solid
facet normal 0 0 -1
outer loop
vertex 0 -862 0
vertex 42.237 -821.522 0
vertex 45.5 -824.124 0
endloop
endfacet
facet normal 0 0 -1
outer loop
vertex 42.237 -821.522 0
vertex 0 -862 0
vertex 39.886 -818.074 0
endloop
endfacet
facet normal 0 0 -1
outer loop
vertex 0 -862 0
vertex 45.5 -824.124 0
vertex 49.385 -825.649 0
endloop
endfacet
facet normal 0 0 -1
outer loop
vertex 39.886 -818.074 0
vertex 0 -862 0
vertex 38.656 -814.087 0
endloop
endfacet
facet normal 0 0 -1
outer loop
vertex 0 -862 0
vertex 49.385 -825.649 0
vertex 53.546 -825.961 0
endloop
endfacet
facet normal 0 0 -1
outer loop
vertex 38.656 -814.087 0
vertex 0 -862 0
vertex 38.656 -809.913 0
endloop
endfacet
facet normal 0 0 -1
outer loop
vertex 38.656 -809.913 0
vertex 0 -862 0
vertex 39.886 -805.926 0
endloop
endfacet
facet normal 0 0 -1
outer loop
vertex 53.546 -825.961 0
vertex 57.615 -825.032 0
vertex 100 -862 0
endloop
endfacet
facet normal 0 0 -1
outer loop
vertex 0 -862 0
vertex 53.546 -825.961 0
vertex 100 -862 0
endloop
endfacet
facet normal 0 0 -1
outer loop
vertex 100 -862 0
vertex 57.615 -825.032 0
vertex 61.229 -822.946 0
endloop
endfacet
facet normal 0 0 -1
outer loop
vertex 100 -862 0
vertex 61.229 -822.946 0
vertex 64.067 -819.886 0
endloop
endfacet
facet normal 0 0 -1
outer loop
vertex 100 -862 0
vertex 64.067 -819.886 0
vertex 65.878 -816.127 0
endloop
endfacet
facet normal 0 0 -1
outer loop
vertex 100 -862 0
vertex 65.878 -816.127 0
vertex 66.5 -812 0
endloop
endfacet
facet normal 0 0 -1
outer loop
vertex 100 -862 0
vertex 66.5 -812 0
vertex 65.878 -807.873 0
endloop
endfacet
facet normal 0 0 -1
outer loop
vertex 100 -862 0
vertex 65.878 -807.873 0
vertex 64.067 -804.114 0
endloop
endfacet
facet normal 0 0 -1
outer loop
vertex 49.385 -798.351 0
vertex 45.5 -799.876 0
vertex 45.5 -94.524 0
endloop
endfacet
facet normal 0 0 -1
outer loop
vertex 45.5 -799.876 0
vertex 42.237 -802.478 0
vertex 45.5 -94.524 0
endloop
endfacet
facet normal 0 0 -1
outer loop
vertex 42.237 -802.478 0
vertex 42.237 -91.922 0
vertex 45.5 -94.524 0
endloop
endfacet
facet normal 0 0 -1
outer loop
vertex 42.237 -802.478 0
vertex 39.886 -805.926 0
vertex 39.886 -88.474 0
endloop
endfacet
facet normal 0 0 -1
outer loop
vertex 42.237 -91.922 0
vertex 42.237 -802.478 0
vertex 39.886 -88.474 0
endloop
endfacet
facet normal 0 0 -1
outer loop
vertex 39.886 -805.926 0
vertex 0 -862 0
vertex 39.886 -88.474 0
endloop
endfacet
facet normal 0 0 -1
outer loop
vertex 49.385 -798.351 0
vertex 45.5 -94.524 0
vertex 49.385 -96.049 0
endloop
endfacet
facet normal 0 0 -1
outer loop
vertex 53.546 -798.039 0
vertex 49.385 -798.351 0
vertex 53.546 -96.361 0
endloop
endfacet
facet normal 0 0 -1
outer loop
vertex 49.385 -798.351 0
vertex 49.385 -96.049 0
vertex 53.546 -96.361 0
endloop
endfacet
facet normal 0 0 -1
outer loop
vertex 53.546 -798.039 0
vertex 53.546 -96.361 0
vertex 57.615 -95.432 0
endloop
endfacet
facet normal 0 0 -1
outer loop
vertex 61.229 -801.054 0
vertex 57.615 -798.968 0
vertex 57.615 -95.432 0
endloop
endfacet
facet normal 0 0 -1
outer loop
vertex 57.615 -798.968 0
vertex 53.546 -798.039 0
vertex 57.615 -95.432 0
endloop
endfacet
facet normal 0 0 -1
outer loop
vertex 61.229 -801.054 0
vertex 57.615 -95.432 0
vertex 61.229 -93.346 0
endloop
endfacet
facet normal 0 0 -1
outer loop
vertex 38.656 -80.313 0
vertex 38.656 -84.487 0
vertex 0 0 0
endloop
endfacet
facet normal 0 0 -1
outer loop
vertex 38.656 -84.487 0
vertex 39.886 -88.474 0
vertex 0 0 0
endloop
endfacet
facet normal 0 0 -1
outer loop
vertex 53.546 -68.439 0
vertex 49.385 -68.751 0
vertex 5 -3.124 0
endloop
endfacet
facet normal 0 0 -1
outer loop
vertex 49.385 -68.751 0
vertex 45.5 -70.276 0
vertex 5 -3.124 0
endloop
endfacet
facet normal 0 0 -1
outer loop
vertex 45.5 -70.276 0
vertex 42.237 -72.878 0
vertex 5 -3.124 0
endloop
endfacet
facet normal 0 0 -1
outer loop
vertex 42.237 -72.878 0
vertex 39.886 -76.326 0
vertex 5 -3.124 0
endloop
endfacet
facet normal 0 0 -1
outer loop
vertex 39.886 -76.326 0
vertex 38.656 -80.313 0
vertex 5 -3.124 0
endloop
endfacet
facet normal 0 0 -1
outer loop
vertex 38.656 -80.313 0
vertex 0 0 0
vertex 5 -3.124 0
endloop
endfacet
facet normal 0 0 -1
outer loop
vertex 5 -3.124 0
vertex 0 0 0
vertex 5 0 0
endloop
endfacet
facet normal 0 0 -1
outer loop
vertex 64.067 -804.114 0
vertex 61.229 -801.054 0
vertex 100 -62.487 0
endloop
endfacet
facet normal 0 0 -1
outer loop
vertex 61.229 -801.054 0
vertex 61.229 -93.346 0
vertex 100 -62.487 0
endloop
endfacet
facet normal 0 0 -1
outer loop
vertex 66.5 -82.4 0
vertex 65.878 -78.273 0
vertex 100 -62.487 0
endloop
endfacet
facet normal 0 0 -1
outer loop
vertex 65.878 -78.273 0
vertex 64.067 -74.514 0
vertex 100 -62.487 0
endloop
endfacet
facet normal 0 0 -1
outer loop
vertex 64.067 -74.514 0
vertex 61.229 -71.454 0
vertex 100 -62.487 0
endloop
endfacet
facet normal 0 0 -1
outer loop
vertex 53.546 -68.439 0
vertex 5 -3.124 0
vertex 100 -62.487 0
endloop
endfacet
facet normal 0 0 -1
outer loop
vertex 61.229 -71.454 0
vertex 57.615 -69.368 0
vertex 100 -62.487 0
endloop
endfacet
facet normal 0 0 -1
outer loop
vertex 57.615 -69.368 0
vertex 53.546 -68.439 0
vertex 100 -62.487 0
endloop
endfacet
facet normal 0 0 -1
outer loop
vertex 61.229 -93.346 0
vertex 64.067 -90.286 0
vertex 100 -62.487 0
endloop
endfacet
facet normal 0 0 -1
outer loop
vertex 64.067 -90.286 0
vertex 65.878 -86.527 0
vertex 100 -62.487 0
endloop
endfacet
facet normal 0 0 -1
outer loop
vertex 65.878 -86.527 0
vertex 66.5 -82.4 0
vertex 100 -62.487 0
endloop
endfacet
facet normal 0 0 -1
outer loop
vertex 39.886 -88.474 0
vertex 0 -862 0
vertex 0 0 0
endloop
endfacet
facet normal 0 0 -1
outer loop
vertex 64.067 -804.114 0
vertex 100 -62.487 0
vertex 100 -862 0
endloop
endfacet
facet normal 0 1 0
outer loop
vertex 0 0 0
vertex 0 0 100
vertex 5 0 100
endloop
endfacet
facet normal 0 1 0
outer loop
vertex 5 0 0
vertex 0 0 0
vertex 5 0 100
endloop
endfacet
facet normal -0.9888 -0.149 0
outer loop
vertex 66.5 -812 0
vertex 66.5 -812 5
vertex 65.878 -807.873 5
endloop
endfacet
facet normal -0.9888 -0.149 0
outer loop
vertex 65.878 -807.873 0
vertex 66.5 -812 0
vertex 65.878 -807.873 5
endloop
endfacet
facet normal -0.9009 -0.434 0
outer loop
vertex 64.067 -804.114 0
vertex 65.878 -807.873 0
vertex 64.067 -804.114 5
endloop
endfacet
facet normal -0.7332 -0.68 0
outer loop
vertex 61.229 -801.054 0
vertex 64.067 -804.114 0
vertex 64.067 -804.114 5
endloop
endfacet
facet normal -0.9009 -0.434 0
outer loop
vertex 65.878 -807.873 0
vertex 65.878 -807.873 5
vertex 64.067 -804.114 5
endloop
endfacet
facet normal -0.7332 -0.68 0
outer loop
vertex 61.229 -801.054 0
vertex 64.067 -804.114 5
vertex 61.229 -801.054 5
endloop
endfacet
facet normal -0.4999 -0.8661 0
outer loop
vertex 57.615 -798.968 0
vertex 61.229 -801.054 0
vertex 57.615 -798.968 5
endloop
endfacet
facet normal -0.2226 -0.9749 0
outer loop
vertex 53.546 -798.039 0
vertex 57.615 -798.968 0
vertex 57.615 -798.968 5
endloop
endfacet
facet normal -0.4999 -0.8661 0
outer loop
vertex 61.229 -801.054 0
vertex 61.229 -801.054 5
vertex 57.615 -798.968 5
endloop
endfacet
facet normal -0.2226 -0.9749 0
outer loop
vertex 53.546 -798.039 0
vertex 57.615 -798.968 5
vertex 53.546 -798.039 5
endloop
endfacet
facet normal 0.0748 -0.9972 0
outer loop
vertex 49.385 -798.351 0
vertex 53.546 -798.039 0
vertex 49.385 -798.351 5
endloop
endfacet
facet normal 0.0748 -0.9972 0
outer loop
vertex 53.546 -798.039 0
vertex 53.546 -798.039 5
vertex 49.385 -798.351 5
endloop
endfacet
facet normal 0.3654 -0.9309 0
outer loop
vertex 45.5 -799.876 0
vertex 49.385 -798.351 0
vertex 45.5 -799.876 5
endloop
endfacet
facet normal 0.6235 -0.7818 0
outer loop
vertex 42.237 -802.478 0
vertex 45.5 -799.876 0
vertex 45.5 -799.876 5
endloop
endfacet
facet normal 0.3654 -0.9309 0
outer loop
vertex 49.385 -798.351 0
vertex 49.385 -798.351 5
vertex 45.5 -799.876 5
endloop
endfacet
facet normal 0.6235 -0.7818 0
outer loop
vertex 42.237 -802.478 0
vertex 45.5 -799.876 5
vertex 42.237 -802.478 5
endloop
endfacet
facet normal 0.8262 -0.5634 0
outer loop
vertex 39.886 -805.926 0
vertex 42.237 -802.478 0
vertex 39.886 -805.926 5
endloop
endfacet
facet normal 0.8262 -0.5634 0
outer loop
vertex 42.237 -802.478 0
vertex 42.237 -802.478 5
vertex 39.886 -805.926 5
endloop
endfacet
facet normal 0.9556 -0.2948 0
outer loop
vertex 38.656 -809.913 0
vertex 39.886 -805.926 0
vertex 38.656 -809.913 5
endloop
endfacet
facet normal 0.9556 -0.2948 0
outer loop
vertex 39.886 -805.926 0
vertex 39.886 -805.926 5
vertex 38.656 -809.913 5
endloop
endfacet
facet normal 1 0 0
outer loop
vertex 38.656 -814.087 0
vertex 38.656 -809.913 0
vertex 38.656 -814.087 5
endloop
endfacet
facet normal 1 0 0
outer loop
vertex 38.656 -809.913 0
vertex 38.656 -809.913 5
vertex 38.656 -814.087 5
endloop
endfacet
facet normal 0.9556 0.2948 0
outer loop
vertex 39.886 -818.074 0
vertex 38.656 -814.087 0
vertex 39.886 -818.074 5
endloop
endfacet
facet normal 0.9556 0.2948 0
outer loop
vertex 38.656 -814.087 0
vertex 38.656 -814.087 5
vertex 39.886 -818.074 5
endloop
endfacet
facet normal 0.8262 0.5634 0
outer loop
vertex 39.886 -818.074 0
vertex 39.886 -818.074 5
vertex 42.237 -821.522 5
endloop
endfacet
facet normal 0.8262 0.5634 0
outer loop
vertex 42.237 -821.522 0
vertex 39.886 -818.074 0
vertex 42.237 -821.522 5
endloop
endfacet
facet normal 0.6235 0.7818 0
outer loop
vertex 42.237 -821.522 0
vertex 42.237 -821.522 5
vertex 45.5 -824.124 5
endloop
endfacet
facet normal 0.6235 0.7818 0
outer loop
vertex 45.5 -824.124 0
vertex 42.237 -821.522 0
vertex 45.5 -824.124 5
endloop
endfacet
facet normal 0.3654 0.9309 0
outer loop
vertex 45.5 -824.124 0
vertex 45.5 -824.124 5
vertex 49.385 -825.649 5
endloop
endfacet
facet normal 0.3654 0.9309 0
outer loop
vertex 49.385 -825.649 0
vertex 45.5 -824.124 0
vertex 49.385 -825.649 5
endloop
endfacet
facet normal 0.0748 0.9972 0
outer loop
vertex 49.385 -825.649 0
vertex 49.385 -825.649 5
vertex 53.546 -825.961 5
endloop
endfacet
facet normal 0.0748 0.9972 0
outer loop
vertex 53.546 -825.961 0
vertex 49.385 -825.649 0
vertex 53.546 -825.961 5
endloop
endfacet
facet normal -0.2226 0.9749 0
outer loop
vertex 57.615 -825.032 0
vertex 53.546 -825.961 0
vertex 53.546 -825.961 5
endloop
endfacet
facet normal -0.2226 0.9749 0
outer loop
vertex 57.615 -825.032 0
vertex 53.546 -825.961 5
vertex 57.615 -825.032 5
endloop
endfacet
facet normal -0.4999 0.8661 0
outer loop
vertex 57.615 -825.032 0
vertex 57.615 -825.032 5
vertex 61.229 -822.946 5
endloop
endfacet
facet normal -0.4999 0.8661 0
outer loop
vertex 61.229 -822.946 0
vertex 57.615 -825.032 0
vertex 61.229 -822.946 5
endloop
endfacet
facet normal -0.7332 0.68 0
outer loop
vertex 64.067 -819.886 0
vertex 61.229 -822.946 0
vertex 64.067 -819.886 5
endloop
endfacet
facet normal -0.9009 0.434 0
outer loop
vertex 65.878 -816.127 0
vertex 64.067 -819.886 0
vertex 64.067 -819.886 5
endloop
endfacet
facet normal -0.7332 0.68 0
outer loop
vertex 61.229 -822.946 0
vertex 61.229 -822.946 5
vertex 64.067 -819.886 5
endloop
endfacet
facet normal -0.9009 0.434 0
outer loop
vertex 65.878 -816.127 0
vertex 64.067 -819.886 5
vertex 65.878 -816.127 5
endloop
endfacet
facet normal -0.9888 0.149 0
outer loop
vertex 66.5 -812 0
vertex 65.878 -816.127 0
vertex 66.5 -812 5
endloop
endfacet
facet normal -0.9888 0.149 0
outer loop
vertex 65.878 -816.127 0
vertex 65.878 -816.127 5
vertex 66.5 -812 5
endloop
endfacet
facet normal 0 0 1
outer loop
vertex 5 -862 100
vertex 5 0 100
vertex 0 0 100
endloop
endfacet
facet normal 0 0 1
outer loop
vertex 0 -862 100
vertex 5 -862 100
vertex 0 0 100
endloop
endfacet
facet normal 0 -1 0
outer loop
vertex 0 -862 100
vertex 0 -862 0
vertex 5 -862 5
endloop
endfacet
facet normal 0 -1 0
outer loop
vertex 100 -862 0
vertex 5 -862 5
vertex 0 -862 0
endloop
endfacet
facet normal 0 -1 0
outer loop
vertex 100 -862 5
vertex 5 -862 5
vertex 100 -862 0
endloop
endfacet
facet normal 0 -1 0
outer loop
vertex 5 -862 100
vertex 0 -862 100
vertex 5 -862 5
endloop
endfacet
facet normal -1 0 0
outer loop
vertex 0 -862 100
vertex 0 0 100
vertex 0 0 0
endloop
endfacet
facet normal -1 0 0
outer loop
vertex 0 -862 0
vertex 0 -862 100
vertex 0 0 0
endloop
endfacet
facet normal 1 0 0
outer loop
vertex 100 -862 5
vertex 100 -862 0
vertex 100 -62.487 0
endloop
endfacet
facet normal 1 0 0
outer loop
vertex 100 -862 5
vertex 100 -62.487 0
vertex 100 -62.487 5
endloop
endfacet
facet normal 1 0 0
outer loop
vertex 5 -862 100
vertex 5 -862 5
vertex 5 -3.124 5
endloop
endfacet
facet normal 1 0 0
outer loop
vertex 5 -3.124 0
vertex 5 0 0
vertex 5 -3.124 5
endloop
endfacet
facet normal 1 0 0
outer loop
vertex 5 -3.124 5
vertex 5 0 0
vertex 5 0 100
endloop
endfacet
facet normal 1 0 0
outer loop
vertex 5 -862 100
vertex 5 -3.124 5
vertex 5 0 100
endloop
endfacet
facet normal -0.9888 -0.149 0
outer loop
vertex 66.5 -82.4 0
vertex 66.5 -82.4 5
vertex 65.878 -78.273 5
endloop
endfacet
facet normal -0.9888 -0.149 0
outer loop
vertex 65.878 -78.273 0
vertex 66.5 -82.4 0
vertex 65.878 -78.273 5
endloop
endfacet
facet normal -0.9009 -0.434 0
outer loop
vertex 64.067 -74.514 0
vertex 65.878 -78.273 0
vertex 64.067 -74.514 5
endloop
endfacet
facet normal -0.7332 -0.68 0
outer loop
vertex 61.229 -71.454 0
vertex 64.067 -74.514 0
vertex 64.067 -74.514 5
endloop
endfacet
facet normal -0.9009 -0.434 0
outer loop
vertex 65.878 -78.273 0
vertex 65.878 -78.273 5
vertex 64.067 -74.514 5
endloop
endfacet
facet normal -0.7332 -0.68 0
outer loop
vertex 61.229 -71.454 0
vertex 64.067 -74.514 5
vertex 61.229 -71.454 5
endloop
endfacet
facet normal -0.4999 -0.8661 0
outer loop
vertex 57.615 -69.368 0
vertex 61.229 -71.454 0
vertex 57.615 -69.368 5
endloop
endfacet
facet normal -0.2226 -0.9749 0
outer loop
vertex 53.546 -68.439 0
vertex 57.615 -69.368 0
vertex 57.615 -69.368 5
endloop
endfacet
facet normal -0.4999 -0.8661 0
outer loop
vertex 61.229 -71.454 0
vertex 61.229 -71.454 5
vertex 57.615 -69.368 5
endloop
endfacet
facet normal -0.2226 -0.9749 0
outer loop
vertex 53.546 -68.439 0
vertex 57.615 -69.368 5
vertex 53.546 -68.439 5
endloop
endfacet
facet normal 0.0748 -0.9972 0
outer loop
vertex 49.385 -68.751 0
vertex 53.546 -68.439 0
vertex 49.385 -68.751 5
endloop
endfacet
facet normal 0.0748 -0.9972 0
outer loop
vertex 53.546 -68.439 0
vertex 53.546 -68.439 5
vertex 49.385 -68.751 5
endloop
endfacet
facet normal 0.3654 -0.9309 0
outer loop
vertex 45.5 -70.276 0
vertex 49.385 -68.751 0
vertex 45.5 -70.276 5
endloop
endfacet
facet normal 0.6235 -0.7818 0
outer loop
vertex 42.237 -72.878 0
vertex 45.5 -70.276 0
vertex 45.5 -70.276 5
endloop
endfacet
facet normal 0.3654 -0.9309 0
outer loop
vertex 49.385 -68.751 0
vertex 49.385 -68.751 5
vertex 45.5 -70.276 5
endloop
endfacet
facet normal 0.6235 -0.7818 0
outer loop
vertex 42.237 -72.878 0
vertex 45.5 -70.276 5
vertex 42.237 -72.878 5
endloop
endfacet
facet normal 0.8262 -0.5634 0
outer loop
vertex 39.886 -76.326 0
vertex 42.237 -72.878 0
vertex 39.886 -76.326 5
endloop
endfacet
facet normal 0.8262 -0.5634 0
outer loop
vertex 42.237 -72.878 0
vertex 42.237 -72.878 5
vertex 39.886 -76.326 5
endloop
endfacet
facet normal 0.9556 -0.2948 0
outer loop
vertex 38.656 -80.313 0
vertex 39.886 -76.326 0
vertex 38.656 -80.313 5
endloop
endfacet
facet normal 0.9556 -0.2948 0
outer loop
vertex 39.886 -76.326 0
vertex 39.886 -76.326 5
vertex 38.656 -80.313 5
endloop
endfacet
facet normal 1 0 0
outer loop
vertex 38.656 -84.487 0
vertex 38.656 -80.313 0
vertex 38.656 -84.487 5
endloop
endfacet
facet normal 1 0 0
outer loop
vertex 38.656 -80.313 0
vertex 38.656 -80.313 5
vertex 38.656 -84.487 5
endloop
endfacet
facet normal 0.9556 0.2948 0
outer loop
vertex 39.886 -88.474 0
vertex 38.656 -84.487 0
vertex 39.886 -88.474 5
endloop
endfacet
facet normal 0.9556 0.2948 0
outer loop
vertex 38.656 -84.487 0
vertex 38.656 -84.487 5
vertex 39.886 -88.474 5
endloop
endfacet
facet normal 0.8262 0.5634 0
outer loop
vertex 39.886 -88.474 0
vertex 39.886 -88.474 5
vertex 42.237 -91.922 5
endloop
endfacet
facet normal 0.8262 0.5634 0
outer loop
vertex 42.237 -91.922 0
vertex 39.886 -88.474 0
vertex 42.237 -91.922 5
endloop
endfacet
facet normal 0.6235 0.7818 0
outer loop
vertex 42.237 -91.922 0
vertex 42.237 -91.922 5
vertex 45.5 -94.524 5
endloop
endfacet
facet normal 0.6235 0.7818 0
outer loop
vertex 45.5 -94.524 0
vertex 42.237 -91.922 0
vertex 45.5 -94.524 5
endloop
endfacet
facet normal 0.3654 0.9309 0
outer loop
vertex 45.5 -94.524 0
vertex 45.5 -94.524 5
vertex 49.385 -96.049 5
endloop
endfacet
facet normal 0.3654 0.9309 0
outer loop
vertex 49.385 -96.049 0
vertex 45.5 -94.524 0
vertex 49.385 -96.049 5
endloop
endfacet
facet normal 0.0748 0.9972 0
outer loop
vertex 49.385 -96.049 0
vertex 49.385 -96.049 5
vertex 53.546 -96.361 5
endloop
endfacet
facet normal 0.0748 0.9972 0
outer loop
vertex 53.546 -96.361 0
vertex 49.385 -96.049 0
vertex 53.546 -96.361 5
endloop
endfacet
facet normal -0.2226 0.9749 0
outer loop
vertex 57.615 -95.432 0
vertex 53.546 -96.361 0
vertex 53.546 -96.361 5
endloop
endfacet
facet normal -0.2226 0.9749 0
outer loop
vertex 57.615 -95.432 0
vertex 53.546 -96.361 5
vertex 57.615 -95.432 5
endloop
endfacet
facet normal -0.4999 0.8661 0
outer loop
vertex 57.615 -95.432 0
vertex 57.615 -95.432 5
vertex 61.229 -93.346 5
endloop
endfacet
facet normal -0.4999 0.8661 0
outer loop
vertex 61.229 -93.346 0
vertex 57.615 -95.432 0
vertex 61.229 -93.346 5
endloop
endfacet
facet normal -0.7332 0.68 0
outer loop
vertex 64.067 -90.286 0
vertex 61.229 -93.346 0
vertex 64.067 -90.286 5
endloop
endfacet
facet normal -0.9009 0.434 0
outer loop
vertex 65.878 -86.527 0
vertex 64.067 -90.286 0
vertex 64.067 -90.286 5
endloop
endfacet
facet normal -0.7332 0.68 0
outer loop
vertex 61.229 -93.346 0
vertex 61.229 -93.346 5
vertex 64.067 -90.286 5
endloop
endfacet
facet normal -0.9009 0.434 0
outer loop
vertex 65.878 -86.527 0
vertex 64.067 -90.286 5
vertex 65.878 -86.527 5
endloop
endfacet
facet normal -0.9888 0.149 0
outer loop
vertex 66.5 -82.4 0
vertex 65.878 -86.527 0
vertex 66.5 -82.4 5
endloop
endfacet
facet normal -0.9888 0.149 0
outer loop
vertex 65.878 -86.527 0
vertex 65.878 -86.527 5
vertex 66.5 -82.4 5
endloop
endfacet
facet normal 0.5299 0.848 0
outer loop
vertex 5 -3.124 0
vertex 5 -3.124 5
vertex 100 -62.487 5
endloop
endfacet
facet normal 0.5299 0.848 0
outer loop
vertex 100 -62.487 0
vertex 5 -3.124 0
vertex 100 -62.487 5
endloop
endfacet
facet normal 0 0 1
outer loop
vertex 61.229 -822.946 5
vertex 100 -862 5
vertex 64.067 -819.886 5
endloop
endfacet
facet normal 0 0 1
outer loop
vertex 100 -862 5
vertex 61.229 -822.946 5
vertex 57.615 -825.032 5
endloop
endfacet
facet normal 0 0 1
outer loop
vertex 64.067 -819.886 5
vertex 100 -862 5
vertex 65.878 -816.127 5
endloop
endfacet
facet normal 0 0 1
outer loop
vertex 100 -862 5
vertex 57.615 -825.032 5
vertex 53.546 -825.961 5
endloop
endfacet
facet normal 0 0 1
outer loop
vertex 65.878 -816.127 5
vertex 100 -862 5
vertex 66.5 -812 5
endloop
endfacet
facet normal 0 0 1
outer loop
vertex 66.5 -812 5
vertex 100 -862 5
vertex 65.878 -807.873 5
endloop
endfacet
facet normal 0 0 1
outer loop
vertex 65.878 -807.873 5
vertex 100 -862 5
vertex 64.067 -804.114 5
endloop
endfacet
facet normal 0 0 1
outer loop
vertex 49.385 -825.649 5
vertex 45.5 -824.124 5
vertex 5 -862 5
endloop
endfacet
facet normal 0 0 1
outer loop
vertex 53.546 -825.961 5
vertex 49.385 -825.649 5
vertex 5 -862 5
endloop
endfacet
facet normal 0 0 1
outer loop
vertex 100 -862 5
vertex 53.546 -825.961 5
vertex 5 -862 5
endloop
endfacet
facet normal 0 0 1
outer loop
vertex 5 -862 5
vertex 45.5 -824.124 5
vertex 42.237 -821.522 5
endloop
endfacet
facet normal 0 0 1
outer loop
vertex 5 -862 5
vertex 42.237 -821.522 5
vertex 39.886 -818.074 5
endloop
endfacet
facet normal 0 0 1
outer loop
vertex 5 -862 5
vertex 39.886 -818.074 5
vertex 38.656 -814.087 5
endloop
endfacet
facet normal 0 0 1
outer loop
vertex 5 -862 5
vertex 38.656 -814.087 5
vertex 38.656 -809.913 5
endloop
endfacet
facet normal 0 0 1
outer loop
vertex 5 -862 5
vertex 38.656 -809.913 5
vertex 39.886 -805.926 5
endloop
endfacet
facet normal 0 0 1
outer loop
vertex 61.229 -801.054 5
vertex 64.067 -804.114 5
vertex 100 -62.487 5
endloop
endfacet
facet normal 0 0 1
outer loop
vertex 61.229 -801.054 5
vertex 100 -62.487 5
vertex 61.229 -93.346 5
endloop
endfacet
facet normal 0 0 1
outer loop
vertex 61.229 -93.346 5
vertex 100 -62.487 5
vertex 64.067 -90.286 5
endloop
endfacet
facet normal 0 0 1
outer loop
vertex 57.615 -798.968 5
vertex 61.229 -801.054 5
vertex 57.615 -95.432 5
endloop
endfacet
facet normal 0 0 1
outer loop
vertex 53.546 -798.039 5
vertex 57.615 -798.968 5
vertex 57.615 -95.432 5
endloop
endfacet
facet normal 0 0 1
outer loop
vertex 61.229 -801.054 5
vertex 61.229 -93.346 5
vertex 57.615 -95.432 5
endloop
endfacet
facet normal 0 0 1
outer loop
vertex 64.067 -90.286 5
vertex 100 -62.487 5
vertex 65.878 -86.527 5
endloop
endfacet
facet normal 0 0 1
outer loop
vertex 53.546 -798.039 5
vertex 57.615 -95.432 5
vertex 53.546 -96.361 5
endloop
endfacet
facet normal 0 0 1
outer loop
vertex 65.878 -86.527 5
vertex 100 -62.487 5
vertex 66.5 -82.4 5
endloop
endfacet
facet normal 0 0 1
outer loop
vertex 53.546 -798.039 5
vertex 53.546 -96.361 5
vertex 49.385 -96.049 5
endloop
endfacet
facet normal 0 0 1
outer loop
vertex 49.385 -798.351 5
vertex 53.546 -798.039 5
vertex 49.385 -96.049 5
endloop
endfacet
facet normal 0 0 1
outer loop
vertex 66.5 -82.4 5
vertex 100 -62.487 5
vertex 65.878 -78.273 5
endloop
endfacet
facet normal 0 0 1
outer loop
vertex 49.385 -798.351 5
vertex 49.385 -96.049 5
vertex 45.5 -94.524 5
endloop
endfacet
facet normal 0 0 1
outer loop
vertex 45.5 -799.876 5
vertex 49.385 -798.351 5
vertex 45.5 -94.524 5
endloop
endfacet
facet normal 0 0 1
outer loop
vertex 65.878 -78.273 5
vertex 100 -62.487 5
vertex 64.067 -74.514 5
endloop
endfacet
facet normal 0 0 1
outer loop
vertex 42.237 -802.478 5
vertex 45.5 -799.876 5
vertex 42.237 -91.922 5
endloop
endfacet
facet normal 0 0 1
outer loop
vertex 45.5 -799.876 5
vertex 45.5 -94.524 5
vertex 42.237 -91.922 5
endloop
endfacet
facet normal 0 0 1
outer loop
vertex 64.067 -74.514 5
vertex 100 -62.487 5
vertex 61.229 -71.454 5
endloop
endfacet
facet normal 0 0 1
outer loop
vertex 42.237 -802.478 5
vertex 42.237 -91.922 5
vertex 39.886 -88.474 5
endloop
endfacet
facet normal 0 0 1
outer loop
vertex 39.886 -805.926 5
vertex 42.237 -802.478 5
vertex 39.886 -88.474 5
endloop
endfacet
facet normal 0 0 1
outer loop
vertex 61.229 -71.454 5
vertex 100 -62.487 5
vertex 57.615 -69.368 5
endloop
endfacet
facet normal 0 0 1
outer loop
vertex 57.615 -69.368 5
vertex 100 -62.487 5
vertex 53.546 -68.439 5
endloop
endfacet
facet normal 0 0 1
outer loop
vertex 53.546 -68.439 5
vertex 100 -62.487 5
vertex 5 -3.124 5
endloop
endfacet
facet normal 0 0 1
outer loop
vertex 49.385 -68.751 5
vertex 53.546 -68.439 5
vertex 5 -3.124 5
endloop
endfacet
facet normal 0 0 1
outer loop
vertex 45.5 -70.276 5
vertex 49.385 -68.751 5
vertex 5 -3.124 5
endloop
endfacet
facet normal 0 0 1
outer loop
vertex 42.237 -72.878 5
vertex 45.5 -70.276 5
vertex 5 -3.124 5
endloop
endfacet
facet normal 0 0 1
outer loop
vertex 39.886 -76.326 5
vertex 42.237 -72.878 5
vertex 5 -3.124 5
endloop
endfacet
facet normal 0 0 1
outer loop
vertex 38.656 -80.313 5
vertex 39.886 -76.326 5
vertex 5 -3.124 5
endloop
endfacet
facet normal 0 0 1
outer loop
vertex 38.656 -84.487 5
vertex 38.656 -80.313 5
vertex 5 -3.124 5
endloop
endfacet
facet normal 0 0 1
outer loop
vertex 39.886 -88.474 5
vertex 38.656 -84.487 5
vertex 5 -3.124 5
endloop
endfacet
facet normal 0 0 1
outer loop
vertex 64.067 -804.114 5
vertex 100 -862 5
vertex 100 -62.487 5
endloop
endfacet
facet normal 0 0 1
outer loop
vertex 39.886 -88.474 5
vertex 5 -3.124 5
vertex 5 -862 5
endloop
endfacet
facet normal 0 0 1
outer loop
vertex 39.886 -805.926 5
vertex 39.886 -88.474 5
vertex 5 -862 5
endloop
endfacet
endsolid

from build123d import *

# Parameters (mm, degrees)
F1_DEPTH = 862
F2_R     = 14
F3_DEPTH = 5
F5_DEPTH = 5


with BuildPart() as f1:
    # F0 (on Front) → F1 (new body)
    with BuildSketch(Plane.XZ):
        Polygon((0, 100), (0, 0), (100, 0), (100, 5), (5, 5), (5, 100), align=None)
    extrude(amount=F1_DEPTH)

    # F2 (on face) → F3 (cut, through all)
    with BuildSketch(Plane.XY.offset(5)):
        with Locations((52.5, -82.4)):
            Circle(F2_R)
        with Locations((52.5, -812)):
            Circle(F2_R)
    extrude(amount=-F3_DEPTH, mode=Mode.SUBTRACT)

    # F4 (on face) → F5 (cut)
    with BuildSketch(Plane.XY.offset(5)):
        Polygon((5, -3.124347), (100, -62.486935), (100, 0), (5, 0), align=None)
    extrude(amount=-F5_DEPTH, mode=Mode.SUBTRACT)


solid = f1.part
